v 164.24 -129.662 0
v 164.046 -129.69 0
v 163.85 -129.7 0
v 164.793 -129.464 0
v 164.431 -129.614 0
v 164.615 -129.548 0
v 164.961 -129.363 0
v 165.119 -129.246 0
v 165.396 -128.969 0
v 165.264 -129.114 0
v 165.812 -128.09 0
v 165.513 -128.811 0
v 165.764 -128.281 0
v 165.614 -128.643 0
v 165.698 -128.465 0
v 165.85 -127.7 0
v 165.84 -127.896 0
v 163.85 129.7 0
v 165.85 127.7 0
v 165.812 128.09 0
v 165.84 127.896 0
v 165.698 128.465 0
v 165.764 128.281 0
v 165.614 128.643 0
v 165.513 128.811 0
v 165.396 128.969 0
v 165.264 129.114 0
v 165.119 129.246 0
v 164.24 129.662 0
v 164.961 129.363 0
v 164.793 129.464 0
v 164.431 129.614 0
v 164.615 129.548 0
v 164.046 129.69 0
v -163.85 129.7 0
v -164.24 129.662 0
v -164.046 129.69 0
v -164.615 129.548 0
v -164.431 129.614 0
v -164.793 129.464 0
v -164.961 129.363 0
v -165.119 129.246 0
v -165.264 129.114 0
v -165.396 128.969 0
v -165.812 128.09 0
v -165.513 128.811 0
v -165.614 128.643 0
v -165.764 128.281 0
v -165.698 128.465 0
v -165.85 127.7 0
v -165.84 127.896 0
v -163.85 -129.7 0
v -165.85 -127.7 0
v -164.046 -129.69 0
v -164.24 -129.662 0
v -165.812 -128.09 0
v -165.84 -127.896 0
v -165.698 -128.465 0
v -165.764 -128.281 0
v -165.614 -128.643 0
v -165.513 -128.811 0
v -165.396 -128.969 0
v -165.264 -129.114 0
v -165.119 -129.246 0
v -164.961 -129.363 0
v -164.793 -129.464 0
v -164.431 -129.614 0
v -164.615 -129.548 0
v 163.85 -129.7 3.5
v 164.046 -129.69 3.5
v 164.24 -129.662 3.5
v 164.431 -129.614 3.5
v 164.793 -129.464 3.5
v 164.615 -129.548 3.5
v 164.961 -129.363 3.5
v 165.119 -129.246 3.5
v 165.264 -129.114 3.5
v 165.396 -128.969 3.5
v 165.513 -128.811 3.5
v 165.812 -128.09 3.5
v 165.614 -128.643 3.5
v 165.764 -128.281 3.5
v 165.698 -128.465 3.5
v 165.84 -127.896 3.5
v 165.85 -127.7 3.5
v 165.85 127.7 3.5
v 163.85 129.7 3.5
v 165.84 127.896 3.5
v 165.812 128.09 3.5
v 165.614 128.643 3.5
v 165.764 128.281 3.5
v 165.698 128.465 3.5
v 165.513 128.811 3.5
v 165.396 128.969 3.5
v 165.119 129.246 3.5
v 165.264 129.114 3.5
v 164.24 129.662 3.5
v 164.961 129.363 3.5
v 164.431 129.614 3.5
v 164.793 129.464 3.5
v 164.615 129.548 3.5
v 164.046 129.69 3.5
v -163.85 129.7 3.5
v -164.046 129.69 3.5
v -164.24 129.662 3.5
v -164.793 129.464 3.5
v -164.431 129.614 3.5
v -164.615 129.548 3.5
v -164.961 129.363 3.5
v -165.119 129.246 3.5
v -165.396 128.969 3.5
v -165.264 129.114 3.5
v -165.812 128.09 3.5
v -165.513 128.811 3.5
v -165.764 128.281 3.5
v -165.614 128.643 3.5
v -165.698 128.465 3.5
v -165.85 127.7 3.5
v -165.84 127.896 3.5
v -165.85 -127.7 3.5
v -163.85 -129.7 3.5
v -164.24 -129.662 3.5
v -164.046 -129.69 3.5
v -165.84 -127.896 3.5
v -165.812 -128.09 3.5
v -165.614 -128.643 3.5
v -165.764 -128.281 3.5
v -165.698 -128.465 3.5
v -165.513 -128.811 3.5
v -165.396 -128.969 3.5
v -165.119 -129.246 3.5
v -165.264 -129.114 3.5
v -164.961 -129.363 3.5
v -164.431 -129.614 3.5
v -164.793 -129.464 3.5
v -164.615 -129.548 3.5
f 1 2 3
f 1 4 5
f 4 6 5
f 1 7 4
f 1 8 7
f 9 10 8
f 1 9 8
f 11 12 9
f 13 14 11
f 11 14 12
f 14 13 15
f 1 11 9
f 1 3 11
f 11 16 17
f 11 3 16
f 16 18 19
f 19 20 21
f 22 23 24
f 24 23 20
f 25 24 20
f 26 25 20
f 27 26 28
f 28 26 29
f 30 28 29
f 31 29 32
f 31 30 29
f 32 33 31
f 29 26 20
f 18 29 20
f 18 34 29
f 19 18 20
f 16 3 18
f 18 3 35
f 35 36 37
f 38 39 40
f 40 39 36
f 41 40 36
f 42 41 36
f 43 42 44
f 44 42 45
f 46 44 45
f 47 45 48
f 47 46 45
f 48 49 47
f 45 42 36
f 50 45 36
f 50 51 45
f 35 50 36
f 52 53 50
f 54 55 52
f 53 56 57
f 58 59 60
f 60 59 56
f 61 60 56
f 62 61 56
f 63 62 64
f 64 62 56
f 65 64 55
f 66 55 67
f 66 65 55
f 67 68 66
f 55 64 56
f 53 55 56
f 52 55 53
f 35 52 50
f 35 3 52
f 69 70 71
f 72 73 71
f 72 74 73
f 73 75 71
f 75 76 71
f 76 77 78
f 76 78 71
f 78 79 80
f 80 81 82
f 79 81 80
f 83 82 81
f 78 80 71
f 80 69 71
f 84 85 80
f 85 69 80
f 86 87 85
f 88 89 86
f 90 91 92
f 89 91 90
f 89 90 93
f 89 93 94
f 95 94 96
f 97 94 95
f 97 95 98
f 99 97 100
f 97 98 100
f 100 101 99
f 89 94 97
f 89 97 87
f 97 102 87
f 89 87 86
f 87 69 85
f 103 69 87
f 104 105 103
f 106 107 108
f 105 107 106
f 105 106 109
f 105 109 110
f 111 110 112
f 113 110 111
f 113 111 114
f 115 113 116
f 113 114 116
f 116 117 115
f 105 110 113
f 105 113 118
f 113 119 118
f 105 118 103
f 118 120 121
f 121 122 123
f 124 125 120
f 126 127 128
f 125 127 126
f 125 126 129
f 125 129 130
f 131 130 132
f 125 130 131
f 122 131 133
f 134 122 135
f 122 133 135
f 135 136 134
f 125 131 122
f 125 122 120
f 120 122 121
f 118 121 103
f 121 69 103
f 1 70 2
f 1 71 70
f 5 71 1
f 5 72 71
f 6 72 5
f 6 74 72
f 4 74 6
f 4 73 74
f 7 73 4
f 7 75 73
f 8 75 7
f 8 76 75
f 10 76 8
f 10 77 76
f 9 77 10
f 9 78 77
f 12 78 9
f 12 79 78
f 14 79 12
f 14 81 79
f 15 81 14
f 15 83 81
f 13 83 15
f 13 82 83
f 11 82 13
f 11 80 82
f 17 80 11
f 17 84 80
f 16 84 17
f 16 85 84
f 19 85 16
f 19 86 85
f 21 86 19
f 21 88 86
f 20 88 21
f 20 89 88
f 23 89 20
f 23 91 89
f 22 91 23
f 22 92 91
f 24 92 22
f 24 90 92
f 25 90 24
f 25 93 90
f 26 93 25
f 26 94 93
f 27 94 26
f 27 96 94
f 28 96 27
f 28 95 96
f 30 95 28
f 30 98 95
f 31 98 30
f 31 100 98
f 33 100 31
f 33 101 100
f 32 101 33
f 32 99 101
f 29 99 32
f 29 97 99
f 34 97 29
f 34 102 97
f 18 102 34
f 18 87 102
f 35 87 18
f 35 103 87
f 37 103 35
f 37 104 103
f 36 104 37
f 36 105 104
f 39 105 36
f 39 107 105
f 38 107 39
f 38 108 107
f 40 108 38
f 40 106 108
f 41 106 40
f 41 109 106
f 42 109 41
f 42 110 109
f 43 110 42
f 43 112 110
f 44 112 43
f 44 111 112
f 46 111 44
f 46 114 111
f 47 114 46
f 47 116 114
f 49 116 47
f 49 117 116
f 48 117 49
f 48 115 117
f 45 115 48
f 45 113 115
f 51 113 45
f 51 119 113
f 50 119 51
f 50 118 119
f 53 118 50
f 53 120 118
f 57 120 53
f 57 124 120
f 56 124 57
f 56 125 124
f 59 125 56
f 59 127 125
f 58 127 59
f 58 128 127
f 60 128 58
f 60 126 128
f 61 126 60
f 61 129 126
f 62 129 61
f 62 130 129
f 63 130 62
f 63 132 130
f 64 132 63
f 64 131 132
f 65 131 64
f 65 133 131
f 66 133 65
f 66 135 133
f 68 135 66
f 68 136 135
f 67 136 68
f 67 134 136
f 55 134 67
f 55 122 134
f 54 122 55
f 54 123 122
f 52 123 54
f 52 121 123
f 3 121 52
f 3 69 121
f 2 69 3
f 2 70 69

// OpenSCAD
// ============================================================
// STORAGE BOX - SLIDING LID
// Matches storage_box_base.scad
// Lid enters side grooves AND rear/end receiving groove
// Units: mm
// ============================================================

$fn = 64;

// ============================================================
// MAIN EXTERNAL BOX DIMENSIONS
// Keep these matched to the base file
// ============================================================

box_length = 335;
box_width  = 266;
box_height = 44;

// ============================================================
// STRUCTURE / FIT PARAMETERS
// Keep these matched to the base file
// ============================================================

wall_thickness = 6.0;
corner_radius  = 5.0;

lid_thickness          = 3.5;
lid_side_clearance     = 0.30;
lid_vertical_clearance = 0.40;
lid_end_clearance      = 0.30;

side_groove_depth = 3.0;
rear_groove_depth = 3.0;

upper_lip_thickness = 1.0;

// ============================================================
// DERIVED LID DIMENSIONS
// ============================================================

internal_width = box_width - 2 * wall_thickness;

// Lid extends into both side-wall receiving grooves.
lid_width =
    internal_width
    + 2 * (side_groove_depth - lid_side_clearance);

// Lid now also extends into the rear/end receiving groove.
// With the current values it enters the 3 mm rear channel
// by 2.70 mm, leaving 0.30 mm clearance at the groove bottom.
lid_length =
    box_length
    - wall_thickness
    + rear_groove_depth
    - lid_end_clearance;

lid_corner_radius = 2.0;

// ============================================================
// HELPERS
// ============================================================

module rounded_rectangle_2d(length, width, radius)
{
    r = min(radius, min(length, width) / 2);

    offset(r = r)
        square([
            length - 2 * r,
            width  - 2 * r
        ], center = true);
}

module rounded_box(length, width, height, radius)
{
    linear_extrude(height = height)
        rounded_rectangle_2d(length, width, radius);
}

// ============================================================
// LID
// ============================================================

module storage_box_lid()
{
    rounded_box(
        lid_length,
        lid_width,
        lid_thickness,
        lid_corner_radius
    );
}

// ============================================================
// OUTPUT
// ============================================================

storage_box_lid();
